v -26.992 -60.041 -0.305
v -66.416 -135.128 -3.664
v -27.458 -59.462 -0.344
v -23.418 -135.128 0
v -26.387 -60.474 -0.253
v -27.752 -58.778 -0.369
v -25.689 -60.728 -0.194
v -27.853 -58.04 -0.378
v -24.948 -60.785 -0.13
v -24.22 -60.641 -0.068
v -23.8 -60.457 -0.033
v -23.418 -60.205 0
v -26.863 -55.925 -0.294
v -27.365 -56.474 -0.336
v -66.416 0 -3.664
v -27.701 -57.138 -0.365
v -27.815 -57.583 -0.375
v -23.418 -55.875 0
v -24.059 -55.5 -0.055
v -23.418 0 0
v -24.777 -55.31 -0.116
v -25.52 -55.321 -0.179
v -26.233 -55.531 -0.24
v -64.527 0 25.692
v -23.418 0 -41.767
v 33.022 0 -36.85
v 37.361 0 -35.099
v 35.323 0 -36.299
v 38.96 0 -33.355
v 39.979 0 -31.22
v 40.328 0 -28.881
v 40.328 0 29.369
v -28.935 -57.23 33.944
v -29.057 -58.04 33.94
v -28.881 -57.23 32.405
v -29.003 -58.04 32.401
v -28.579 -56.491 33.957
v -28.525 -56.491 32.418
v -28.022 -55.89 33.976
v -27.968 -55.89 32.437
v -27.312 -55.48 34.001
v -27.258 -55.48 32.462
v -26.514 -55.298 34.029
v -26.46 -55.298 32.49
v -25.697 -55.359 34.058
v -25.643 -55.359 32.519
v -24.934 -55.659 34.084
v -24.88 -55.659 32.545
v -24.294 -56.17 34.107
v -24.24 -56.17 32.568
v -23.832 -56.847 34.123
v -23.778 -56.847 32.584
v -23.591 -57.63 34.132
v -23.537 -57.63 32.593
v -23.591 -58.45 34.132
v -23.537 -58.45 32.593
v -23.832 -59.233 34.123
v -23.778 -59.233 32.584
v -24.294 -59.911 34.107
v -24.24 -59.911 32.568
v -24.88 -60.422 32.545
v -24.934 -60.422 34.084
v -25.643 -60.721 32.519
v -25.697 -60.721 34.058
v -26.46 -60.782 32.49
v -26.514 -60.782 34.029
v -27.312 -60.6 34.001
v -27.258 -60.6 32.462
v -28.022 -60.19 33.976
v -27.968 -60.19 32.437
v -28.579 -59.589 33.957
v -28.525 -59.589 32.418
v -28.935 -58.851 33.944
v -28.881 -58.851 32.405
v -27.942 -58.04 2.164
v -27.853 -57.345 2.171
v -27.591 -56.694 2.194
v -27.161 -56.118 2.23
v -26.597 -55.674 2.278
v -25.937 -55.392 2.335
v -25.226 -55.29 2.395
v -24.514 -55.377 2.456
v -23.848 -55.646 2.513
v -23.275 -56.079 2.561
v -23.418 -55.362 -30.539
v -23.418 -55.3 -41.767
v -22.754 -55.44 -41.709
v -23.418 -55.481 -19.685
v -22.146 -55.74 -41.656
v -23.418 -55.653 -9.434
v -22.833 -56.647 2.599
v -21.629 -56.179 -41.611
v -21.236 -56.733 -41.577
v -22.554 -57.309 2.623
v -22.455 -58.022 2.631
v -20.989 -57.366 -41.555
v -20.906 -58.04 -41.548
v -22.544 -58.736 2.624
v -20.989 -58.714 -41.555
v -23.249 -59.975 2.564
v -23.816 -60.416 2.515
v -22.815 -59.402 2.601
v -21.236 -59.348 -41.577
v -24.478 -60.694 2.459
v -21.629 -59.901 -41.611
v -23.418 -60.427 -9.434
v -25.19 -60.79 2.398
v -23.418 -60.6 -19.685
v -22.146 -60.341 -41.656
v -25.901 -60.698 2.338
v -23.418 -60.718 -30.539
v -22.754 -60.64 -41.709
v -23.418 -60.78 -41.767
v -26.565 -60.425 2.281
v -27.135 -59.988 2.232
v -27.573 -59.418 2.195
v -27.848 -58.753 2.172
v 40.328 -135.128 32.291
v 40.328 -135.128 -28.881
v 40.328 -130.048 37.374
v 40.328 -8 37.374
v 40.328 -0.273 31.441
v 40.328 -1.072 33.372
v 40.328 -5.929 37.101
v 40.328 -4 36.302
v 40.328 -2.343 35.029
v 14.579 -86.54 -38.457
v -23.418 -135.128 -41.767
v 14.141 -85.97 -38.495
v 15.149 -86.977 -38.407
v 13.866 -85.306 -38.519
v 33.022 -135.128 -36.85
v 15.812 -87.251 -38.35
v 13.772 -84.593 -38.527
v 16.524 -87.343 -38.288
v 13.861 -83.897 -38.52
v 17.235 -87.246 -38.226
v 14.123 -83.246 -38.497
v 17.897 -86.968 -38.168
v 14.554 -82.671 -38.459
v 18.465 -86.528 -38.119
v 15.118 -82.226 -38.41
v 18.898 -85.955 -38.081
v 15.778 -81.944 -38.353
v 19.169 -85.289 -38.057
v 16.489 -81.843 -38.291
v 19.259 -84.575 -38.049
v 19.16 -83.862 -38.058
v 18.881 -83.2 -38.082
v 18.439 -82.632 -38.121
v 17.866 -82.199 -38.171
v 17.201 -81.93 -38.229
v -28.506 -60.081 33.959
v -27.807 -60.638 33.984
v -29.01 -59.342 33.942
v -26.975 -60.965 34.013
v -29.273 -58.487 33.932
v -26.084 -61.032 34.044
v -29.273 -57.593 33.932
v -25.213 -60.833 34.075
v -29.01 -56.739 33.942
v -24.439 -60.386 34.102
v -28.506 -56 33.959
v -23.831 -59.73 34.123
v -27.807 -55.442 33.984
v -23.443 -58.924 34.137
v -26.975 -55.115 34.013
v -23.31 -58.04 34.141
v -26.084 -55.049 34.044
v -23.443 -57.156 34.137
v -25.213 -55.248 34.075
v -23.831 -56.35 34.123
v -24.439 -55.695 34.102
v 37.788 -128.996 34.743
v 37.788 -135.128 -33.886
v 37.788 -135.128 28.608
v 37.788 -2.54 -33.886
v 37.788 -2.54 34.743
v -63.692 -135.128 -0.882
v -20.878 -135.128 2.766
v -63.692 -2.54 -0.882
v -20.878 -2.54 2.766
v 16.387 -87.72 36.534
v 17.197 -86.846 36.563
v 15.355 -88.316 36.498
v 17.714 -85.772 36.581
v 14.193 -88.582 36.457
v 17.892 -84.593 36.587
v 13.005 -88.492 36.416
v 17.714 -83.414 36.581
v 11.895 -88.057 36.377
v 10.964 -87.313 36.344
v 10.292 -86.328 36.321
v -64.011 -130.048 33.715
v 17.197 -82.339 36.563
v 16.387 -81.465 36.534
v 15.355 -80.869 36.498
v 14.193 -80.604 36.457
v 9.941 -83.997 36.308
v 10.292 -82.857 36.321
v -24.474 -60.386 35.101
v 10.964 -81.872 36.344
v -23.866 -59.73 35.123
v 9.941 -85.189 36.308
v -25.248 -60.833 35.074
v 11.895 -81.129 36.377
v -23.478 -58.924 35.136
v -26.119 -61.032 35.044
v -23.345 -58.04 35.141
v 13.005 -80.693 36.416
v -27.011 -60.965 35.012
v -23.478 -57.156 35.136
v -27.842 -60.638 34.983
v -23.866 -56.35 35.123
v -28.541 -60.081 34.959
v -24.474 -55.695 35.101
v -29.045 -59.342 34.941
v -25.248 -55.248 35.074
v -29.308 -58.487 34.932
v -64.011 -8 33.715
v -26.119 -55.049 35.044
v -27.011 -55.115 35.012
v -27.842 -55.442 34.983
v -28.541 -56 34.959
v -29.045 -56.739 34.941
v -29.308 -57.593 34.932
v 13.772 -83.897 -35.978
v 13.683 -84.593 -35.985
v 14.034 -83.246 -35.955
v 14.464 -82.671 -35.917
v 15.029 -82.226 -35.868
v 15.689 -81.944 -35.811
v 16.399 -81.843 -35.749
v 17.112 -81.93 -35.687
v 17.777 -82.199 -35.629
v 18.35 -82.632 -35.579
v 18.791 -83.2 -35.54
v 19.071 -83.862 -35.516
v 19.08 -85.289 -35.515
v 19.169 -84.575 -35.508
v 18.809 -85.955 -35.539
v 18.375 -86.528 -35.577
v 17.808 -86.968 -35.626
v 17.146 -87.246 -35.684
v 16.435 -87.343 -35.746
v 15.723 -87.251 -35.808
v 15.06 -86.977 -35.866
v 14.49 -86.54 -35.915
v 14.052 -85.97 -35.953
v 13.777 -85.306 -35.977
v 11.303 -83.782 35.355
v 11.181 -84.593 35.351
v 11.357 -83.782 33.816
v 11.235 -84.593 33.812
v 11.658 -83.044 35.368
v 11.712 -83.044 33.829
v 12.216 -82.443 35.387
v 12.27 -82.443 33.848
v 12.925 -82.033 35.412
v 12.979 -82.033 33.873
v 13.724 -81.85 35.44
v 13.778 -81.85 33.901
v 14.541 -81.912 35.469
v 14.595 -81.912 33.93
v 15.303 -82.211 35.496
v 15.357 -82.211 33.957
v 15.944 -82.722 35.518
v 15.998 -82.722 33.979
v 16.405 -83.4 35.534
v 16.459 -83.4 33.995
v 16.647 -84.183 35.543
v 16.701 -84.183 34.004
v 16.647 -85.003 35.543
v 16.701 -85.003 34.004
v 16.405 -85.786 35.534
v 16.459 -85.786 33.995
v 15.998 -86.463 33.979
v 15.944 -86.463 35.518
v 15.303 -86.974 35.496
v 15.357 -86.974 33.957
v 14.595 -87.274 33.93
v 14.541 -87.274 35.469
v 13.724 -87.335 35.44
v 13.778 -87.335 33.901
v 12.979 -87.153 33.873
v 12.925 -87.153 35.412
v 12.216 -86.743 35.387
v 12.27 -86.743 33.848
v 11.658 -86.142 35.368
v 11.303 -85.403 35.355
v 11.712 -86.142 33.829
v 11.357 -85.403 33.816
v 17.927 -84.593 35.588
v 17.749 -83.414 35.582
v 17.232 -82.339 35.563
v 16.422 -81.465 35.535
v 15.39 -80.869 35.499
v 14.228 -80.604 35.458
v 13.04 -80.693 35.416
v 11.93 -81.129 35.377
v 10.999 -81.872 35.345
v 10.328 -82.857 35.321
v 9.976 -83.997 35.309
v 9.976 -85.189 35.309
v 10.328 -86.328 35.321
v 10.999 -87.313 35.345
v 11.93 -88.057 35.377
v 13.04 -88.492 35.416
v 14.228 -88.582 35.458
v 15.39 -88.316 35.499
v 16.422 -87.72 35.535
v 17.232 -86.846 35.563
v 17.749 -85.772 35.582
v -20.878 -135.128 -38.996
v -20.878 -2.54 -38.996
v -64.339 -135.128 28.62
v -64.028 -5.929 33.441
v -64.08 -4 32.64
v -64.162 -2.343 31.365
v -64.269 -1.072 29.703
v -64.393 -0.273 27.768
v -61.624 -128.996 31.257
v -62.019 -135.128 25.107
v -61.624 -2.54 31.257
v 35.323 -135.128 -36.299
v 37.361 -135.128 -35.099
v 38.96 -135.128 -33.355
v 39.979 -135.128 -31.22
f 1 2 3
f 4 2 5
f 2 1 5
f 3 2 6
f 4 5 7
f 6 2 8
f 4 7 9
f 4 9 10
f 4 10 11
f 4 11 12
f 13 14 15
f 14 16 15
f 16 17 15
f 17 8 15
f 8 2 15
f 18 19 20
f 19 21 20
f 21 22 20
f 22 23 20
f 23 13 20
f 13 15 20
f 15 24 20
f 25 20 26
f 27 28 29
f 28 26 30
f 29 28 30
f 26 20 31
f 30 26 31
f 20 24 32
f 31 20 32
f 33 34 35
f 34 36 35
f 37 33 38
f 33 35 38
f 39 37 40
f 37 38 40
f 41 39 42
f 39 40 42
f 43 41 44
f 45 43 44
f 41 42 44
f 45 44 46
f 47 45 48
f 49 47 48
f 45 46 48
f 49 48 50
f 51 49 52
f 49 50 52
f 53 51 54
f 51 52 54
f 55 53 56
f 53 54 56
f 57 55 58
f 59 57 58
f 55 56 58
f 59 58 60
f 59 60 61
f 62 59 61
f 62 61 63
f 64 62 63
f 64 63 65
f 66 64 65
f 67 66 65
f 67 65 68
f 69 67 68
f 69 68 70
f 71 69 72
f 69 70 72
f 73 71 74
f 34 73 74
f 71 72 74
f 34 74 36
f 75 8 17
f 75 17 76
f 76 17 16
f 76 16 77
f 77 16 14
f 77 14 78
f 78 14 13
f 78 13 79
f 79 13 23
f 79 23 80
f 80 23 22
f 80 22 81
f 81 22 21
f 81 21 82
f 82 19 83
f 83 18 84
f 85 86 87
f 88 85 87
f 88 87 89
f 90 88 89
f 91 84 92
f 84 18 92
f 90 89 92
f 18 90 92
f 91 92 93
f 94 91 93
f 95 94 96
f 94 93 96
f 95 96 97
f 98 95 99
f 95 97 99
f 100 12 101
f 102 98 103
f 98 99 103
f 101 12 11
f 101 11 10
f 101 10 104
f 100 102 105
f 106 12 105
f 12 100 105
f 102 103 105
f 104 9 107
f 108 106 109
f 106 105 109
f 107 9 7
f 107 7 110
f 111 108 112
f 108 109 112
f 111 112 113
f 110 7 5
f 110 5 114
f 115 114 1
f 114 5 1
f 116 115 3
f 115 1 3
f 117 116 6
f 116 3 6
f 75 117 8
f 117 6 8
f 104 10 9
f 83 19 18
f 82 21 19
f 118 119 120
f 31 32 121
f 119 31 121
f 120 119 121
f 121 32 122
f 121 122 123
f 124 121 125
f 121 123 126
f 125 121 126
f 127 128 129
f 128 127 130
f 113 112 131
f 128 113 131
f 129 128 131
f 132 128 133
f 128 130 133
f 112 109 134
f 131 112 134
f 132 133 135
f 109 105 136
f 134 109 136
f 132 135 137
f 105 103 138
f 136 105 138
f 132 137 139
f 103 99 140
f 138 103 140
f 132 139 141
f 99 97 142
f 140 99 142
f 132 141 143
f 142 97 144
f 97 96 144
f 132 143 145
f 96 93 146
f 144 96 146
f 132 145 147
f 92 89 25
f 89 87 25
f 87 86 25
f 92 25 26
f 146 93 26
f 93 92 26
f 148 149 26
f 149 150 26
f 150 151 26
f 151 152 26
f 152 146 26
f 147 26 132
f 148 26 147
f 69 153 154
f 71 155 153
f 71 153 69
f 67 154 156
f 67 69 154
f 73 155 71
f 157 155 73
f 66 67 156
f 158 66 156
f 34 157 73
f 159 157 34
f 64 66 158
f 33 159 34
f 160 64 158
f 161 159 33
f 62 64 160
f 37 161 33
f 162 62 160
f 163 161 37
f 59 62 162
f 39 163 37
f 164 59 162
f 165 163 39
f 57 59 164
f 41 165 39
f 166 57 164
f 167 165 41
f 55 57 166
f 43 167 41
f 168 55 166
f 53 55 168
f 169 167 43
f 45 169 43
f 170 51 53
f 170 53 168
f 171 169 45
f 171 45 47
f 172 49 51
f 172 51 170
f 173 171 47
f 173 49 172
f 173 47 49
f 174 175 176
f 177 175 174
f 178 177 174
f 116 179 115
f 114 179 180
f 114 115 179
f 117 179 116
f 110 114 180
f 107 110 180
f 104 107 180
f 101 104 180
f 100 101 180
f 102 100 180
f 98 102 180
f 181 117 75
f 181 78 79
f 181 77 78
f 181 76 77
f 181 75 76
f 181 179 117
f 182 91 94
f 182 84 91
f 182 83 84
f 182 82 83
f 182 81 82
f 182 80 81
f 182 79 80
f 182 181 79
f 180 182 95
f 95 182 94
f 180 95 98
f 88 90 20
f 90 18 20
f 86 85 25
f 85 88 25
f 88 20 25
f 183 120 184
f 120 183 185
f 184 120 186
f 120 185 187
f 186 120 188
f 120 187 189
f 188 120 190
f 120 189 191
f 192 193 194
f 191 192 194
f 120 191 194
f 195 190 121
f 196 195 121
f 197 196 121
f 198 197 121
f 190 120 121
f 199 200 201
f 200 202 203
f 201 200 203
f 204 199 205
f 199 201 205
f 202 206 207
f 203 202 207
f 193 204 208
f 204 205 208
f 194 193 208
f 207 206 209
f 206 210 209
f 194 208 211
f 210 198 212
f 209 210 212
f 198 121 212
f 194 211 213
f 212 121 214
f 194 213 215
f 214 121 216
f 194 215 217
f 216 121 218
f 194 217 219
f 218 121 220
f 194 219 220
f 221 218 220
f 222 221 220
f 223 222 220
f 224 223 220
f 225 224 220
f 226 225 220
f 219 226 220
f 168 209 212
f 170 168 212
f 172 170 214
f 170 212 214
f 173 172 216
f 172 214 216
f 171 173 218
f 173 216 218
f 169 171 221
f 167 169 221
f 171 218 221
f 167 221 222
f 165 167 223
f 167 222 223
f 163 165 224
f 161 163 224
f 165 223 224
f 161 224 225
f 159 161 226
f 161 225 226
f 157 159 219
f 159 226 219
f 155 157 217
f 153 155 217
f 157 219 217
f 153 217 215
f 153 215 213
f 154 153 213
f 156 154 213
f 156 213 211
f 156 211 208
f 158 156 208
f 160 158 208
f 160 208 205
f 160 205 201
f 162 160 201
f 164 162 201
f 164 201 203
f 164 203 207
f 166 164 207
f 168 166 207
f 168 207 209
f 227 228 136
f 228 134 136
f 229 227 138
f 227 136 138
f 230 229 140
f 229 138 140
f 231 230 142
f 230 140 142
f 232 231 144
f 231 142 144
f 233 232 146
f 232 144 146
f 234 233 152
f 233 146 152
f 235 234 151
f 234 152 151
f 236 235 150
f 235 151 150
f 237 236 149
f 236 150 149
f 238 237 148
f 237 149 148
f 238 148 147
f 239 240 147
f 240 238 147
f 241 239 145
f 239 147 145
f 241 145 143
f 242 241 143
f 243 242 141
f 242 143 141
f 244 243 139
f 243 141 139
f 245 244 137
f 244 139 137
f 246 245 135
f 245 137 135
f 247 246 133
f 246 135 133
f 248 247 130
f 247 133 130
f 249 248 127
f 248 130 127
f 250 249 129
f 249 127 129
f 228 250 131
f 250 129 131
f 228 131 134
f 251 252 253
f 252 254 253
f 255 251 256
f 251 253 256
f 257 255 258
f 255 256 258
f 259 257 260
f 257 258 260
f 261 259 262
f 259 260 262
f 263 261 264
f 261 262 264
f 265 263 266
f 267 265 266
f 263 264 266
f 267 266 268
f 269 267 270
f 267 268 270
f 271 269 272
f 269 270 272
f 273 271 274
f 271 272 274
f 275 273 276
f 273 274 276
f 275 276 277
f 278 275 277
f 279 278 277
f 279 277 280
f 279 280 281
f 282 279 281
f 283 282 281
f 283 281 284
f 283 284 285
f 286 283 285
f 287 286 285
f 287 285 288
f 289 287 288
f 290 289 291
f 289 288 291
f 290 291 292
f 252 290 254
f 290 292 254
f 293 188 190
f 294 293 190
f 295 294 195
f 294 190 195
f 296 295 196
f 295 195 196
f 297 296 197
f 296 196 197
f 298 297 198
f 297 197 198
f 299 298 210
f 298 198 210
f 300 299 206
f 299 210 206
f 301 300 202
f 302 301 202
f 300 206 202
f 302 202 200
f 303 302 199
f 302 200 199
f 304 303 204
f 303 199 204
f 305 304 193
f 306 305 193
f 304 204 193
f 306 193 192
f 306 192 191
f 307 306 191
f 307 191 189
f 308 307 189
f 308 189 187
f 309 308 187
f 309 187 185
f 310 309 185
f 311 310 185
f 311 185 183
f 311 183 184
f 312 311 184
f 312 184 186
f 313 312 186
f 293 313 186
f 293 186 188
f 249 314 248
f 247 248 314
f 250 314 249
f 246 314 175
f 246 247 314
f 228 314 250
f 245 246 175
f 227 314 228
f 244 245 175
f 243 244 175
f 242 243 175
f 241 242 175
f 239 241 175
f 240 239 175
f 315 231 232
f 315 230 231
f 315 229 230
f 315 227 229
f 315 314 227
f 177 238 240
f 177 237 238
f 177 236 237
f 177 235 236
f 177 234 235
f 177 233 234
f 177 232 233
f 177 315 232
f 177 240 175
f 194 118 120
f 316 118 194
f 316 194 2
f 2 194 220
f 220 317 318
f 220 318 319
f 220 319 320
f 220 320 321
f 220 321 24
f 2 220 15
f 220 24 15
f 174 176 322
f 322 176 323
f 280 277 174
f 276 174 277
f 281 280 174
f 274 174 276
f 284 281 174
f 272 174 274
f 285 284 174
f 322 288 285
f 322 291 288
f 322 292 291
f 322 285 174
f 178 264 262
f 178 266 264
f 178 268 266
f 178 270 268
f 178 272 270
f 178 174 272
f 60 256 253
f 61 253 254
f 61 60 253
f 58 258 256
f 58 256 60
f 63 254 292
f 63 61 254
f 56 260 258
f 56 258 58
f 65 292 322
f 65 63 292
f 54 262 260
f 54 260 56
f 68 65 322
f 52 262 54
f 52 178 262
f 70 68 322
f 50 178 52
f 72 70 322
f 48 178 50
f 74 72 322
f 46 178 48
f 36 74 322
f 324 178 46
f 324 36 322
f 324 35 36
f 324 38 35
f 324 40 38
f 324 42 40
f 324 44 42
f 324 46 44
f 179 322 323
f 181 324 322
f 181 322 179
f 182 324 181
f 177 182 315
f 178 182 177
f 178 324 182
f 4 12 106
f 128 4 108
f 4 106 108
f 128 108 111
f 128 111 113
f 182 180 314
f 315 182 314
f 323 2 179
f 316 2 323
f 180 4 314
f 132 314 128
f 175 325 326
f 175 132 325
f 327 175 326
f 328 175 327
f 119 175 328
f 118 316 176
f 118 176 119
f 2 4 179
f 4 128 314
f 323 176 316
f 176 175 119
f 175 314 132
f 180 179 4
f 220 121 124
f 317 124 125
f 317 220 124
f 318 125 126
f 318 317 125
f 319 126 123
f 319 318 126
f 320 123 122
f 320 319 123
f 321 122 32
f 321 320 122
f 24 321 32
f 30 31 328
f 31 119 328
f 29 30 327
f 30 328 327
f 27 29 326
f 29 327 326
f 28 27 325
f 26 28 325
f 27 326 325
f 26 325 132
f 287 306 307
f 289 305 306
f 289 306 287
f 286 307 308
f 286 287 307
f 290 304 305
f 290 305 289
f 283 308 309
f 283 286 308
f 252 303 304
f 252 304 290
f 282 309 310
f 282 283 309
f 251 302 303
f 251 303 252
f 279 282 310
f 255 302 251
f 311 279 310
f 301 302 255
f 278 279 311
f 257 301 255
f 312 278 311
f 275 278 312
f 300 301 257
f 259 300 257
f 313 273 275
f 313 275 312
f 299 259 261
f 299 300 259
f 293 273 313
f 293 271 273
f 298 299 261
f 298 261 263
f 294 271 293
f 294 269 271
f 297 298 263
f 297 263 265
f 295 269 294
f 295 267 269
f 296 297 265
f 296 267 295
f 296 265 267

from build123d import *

# Parameters (mm, degrees)
F0_W            = 71.5283732861
F0_H            = 64.1776323318
F1_DEPTH        = 89.916
F2_SIZE2        = 25.4
F2_SIZE         = 5.08
F5_DEPTH        = 135.128
F6_SIZE         = 5.08
F7_T            = -2.54
F9_D            = 5.5
F9_CBORE_D      = 6
F9_CBORE_DEPTH  = 1
F10_D           = 5.5
F10_CBORE_D     = 8
F10_CBORE_DEPTH = 1
F11_R           = 8
F12_R           = 8


with BuildPart() as f1:
    # F0 (on Front) → F1 (new body)
    with BuildSketch(Plane.XZ):
        with Locations((6.926660426, -4.6648941934)):
            Rectangle(F0_W, F0_H)
    extrude(amount=F1_DEPTH)

    # F2
    f2_edges = [f1.edges().sort_by_distance(p)[0] for p in [
        (42.690847, -44.958, 27.423922),
    ]]
    f2_side = f1.faces().sort_by_distance((6.92666, -44.958, 27.423922))[0]
    chamfer(f2_edges, length=F2_SIZE, length2=F2_SIZE2, reference=f2_side)


with BuildPart() as f5:
    # F4 (on Front) → F5 (new body)
    with BuildSketch(Plane.XZ):
        Polygon((40.32824561, 37.3740494251), (-64.0106573701, 33.7145887315), (-66.4161741734, -3.6638199817), (-23.4177149832, 0), (-23.4177149832, -41.7669005692), (40.32824561, -36.2140648067), align=None)
    extrude(amount=F5_DEPTH)

    # F6
    f6_edges = [f5.edges().sort_by_distance(p)[0] for p in [
        (-11.841206, -135.128, 35.544319),
    ]]
    chamfer(f6_edges, length=F6_SIZE)

    # F7
    f7_openings = [f5.faces().sort_by_distance(p)[0] for p in [
        (-3.73286, -135.128, 0.037818),
    ]]
    offset(amount=F7_T, openings=f7_openings, kind=Kind.INTERSECTION)

    # F9 (through all)
    with Locations(Plane(origin=(-1.2596562909, 0, 35.915443977), x_dir=(0.9993855151, 0, 0.0350512791), z_dir=(-0.0350512791, 0, 0.9993855151))):
        with Locations((-25.099163875, -58.0401532352)):
            CounterBoreHole(F9_D / 2, F9_CBORE_D / 2, F9_CBORE_DEPTH)

    # F10 (through all)
    with Locations(Plane(origin=(-1.2596562909, 0, 35.915443977), x_dir=(0.9993855151, 0, 0.0350512791), z_dir=(-0.0350512791, 0, 0.9993855151))):
        with Locations((15.1631087065, -84.5927745104)):
            CounterBoreHole(F10_D / 2, F10_CBORE_D / 2, F10_CBORE_DEPTH)

    # F11
    f11_edges = [f5.edges().sort_by_distance(p)[0] for p in [
        (-11.841206, 0, 35.544319),
    ]]
    fillet(f11_edges, radius=F11_R)

    # F12
    f12_edges = [f5.edges().sort_by_distance(p)[0] for p in [
        (40.328246, -67.564, -36.214065),
    ]]
    fillet(f12_edges, radius=F12_R)


solid = f5.part
